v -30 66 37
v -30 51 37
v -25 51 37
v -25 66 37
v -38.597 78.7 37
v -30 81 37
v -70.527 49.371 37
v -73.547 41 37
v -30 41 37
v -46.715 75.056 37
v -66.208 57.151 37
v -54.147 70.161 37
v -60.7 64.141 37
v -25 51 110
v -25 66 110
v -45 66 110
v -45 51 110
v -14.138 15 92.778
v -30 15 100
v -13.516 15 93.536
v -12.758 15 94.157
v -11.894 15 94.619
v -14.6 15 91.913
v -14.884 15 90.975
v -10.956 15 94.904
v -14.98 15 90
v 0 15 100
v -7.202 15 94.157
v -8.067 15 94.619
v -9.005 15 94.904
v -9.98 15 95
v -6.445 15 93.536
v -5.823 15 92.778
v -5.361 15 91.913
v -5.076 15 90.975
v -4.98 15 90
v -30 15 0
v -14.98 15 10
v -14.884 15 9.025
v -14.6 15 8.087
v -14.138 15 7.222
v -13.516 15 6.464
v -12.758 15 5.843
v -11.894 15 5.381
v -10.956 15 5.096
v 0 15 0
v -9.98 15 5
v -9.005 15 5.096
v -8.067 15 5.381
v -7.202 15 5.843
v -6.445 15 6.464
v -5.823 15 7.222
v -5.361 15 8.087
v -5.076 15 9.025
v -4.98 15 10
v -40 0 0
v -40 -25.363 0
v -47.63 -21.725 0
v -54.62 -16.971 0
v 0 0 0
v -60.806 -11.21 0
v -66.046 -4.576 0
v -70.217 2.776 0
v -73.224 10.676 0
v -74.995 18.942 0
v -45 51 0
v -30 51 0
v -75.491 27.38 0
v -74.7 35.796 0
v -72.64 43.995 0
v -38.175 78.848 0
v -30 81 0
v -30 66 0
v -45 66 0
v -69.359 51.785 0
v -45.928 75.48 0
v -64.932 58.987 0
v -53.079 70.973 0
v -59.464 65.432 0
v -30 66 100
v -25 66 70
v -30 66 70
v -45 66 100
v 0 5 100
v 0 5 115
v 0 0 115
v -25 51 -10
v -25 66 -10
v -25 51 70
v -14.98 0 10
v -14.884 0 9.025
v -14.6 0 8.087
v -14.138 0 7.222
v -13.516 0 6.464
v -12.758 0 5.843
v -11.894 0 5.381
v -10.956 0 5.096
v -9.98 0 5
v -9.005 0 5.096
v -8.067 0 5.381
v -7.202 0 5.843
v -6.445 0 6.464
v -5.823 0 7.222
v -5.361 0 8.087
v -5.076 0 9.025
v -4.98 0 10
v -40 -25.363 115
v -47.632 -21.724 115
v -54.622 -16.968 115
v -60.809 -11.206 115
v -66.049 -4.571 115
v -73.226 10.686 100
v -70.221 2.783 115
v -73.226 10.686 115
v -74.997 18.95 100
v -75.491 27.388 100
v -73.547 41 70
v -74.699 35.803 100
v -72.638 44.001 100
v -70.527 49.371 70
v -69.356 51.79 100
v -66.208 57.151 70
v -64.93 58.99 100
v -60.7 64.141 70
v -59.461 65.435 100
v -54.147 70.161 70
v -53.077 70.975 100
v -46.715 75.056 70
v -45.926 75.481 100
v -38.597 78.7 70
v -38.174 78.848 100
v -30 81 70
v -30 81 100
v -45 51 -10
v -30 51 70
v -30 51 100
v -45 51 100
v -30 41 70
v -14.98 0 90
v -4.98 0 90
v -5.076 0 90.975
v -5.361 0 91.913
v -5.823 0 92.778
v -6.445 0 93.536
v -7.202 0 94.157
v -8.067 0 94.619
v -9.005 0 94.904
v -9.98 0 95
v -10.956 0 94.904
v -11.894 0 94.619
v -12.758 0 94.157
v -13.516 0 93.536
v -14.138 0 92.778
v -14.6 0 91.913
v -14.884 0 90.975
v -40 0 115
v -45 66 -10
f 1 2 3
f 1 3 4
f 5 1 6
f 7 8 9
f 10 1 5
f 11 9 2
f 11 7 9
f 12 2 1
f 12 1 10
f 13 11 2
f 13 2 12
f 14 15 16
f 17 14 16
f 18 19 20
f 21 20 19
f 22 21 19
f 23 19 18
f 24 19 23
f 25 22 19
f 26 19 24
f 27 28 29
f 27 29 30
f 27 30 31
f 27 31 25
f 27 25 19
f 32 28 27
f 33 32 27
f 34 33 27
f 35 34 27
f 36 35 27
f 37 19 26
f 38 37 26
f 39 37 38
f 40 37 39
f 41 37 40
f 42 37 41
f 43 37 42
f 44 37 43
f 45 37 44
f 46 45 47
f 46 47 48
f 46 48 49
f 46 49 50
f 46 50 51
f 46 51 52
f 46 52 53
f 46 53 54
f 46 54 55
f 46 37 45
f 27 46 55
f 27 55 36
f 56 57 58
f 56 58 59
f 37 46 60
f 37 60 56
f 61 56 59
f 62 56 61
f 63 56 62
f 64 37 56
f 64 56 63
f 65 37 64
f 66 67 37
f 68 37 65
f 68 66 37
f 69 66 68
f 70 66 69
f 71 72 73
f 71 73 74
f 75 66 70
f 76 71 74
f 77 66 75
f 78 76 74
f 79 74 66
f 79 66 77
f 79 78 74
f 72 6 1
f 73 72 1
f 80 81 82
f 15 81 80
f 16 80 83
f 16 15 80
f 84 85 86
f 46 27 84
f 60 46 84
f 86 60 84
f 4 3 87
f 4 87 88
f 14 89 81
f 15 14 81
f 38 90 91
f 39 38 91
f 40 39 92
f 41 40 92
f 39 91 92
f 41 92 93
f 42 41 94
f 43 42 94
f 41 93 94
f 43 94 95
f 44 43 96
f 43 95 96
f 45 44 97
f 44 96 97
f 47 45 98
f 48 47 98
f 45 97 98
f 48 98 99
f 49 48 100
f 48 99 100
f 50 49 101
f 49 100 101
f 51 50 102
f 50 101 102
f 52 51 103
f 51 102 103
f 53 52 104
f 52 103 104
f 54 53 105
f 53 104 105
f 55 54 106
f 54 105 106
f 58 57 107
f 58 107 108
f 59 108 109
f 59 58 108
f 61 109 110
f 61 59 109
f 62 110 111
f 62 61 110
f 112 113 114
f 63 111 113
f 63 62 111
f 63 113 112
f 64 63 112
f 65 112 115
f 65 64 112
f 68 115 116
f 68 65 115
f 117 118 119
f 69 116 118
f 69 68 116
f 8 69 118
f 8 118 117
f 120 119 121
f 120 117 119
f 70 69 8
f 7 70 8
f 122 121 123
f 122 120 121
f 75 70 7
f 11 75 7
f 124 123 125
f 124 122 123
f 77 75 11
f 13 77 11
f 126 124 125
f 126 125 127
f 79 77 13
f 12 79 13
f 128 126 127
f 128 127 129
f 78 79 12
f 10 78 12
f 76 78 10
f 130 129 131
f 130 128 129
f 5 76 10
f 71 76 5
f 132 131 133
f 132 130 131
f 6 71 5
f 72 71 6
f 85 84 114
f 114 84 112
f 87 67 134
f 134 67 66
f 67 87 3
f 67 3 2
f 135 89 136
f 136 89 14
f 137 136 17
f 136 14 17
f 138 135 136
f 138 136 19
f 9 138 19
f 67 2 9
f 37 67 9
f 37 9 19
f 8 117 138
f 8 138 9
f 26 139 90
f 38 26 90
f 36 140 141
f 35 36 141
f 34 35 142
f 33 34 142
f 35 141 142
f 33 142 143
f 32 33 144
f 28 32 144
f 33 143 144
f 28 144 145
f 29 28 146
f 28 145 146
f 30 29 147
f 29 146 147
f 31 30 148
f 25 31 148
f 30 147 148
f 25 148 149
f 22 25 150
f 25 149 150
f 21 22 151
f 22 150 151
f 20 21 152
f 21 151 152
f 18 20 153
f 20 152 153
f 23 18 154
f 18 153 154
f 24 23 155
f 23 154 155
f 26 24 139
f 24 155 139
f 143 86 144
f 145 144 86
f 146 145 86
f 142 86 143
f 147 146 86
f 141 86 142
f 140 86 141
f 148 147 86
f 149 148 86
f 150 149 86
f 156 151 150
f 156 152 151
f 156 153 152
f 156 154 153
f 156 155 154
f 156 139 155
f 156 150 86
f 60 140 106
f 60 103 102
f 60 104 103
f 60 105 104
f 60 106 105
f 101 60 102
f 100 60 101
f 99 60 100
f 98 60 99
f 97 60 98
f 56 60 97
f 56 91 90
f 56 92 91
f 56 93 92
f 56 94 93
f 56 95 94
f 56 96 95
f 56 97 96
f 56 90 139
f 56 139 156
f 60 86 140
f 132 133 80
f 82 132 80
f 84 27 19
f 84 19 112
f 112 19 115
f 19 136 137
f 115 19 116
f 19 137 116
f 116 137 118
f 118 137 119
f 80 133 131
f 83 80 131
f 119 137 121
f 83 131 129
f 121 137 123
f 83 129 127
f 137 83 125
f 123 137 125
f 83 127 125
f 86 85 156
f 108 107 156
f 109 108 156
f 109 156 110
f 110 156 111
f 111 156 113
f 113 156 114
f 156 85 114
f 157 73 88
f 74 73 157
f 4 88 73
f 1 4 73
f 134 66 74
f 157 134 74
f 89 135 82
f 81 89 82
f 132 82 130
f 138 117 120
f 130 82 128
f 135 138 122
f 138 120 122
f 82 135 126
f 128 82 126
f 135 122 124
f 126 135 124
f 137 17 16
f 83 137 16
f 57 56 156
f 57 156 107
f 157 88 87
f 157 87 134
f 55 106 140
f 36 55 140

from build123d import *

# Parameters (mm, degrees)
BOSS_EXTRUDE1_DEPTH      = 115
CUT_EXTRUDE1_START       = -15
CUT_EXTRUDE1_DEPTH       = 15
BOSS_EXTRUDE2_DEPTH      = 10
BOSS_EXTRUDE2_DEPTH_BACK = 110
SKETCH3_W                = 20
SKETCH3_H                = 15
CUT_EXTRUDE2_DEPTH       = 148.83859442
CUT_EXTRUDE2_DEPTH_BACK  = 148.83859442
SKETCH4_W                = 33
SKETCH4_H                = 40
CUT_EXTRUDE3_DEPTH       = 153.581945197
CUT_EXTRUDE3_DEPTH_BACK  = 153.581945197


with BuildPart() as part:
    # Sketch1 → Boss-Extrude1 (new body)
    with BuildSketch(Plane.XY):
        with BuildLine():
            Line((0, 0), (-40, 0))
            Line((-40, 0), (-40, -25.362796982))
            ThreePointArc((-40, -25.362796982), (-75.256322222, 31.603413808), (-30, 81))
            Line((-30, 81), (-30, 15))
            Line((-30, 15), (0, 15))
            Line((0, 15), (0, 0))
        make_face()
    extrude(amount=BOSS_EXTRUDE1_DEPTH)

    # Sketch2 → Cut-Extrude1 (cut)
    with BuildSketch(Plane.XY.offset(115).offset(CUT_EXTRUDE1_START)):
        with BuildLine():
            Line((0, 5), (-73.226382592, 10.685668923))
            ThreePointArc((-73.226382592, 10.685668923), (-67.28023004, 55.474290815), (-30, 81))
            Line((-30, 81), (-30, 15))
            Line((-30, 15), (0, 15))
            Line((0, 15), (0, 5))
        make_face()
    extrude(amount=CUT_EXTRUDE1_DEPTH, mode=Mode.SUBTRACT)

    # Sketch3 → Boss-Extrude2 (add, two sides: drawn at the far end of the back side and taken through both)
    with BuildSketch(Plane(origin=(0, 0, 0), x_dir=(-1, 0, 0), z_dir=(0, 0, -1)).offset(-BOSS_EXTRUDE2_DEPTH_BACK)):
        with Locations((35, 58.5)):
            Rectangle(SKETCH3_W, SKETCH3_H)
    extrude(amount=BOSS_EXTRUDE2_DEPTH + BOSS_EXTRUDE2_DEPTH_BACK)

    # Sketch4 → Cut-Extrude2 (cut, two sides: drawn at the far end of the back side and taken through both)
    with BuildSketch(Plane(origin=(-30, 0, 0), x_dir=(0, 0, -1), z_dir=(1, 0, 0)).offset(-CUT_EXTRUDE2_DEPTH_BACK)):
        with Locations((-53.5, 61)):
            Rectangle(SKETCH4_W, SKETCH4_H)
    extrude(amount=CUT_EXTRUDE2_DEPTH + CUT_EXTRUDE2_DEPTH_BACK, mode=Mode.SUBTRACT)

    # Sketch5 → Cut-Extrude3 (cut, two sides: drawn at the far end of the back side and taken through both)
    with BuildSketch(Plane(origin=(0, 15, 0), x_dir=(1, 0, 0), z_dir=(0, 1, 0)).offset(-CUT_EXTRUDE3_DEPTH_BACK)):
        with BuildLine():
            Line((-4.98034548, -10), (-4.98034548, -90))
            ThreePointArc((-4.98034548, -90), (-9.98034548, -95), (-14.98034548, -90))
            Line((-14.98034548, -90), (-14.98034548, -10))
            ThreePointArc((-14.98034548, -10), (-9.98034548, -5), (-4.98034548, -10))
        make_face()
    extrude(amount=CUT_EXTRUDE3_DEPTH + CUT_EXTRUDE3_DEPTH_BACK, mode=Mode.SUBTRACT)


solid = part.part
